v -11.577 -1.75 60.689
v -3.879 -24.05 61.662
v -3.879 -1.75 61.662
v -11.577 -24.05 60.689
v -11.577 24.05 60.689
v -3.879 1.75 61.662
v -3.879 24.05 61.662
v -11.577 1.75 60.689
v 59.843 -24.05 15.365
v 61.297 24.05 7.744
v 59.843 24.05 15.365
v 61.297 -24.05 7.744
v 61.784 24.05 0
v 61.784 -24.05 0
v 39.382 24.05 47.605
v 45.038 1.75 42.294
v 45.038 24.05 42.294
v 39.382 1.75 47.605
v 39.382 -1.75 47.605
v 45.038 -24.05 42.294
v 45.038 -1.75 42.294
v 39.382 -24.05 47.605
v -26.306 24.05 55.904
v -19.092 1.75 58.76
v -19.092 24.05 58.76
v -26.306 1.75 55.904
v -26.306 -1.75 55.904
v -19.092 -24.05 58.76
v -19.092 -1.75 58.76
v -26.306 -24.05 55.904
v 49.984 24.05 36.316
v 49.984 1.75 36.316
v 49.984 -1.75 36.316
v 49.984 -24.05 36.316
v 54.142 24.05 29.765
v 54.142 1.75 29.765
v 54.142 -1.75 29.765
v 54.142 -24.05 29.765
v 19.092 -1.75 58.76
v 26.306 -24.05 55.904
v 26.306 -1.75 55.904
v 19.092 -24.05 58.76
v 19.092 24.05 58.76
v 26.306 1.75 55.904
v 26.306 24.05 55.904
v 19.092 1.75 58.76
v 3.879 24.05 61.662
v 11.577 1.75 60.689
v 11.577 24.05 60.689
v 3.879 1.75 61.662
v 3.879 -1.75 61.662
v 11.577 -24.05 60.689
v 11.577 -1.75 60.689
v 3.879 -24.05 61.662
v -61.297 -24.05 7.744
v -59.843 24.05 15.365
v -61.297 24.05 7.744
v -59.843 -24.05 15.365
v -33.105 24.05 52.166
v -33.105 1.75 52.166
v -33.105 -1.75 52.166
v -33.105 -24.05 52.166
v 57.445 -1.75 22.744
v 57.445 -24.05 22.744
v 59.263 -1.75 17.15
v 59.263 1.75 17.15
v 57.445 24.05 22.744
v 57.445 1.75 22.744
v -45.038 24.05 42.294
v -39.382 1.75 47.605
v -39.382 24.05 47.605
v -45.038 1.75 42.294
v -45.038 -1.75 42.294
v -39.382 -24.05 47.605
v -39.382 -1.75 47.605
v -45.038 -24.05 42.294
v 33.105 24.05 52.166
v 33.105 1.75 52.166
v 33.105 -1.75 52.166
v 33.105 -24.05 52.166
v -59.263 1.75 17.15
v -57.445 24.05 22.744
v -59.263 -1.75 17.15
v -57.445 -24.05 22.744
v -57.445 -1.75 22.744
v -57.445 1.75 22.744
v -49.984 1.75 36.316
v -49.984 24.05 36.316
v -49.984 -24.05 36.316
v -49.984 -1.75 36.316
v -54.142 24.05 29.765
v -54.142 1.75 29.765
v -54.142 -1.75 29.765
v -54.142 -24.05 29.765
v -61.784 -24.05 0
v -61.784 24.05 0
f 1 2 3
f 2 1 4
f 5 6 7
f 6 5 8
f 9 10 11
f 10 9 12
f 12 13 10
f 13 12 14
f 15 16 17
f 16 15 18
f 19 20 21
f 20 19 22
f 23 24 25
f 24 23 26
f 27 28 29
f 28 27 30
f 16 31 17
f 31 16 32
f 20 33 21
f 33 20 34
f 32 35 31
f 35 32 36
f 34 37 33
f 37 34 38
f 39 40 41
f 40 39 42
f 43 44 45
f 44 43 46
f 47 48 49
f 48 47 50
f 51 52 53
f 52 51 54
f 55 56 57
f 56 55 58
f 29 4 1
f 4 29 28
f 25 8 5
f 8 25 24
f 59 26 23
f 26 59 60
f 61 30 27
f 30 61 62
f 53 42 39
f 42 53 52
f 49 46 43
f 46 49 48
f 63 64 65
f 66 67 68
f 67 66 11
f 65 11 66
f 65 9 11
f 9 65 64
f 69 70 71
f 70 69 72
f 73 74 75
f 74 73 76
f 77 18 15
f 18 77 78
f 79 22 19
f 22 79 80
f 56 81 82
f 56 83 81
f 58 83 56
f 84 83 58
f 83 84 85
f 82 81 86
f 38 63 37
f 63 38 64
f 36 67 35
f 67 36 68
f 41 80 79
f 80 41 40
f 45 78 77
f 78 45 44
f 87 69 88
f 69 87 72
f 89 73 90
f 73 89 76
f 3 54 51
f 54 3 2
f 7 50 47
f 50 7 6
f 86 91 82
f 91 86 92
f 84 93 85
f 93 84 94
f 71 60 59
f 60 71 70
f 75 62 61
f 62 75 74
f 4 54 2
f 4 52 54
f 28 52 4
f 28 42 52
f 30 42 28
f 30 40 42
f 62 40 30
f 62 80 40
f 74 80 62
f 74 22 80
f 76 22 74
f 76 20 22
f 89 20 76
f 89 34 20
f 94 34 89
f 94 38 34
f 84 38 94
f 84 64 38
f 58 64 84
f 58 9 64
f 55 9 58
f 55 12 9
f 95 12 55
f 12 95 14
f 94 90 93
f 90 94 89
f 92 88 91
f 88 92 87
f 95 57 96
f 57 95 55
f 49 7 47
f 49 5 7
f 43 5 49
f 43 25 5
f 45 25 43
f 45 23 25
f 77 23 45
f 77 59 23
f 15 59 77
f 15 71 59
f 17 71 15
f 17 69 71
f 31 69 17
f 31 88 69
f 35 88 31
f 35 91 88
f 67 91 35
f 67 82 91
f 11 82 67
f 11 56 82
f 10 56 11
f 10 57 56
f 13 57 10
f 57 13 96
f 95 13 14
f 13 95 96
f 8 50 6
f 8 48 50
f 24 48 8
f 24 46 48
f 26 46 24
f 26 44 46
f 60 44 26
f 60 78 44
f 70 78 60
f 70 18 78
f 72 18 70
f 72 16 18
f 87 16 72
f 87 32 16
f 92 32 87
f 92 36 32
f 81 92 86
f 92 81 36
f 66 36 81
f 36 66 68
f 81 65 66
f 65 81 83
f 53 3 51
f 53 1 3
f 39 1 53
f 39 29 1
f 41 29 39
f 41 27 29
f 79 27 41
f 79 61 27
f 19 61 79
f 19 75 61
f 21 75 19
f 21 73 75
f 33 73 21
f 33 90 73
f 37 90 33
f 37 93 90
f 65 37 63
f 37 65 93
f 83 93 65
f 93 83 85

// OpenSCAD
//number of records
records=1;

for(i=[0:1:records-1])
{
    translate([0,25*i,0])    difference(){
difference(){
    $fn=50;
rotate([90,0,0])cylinder(38.1+10,114.3/1.85,114.3/1.85,center=true);
translate([0,0,-314.3/2-10])rotate([90,0,0])cube([314.3*2+50,314.3+20,314.3],center=true);
}
translate([0,0,114.3+60])rotate([-90,0,0])cube([314.3,314.3,3.5], center=true);
}
}
